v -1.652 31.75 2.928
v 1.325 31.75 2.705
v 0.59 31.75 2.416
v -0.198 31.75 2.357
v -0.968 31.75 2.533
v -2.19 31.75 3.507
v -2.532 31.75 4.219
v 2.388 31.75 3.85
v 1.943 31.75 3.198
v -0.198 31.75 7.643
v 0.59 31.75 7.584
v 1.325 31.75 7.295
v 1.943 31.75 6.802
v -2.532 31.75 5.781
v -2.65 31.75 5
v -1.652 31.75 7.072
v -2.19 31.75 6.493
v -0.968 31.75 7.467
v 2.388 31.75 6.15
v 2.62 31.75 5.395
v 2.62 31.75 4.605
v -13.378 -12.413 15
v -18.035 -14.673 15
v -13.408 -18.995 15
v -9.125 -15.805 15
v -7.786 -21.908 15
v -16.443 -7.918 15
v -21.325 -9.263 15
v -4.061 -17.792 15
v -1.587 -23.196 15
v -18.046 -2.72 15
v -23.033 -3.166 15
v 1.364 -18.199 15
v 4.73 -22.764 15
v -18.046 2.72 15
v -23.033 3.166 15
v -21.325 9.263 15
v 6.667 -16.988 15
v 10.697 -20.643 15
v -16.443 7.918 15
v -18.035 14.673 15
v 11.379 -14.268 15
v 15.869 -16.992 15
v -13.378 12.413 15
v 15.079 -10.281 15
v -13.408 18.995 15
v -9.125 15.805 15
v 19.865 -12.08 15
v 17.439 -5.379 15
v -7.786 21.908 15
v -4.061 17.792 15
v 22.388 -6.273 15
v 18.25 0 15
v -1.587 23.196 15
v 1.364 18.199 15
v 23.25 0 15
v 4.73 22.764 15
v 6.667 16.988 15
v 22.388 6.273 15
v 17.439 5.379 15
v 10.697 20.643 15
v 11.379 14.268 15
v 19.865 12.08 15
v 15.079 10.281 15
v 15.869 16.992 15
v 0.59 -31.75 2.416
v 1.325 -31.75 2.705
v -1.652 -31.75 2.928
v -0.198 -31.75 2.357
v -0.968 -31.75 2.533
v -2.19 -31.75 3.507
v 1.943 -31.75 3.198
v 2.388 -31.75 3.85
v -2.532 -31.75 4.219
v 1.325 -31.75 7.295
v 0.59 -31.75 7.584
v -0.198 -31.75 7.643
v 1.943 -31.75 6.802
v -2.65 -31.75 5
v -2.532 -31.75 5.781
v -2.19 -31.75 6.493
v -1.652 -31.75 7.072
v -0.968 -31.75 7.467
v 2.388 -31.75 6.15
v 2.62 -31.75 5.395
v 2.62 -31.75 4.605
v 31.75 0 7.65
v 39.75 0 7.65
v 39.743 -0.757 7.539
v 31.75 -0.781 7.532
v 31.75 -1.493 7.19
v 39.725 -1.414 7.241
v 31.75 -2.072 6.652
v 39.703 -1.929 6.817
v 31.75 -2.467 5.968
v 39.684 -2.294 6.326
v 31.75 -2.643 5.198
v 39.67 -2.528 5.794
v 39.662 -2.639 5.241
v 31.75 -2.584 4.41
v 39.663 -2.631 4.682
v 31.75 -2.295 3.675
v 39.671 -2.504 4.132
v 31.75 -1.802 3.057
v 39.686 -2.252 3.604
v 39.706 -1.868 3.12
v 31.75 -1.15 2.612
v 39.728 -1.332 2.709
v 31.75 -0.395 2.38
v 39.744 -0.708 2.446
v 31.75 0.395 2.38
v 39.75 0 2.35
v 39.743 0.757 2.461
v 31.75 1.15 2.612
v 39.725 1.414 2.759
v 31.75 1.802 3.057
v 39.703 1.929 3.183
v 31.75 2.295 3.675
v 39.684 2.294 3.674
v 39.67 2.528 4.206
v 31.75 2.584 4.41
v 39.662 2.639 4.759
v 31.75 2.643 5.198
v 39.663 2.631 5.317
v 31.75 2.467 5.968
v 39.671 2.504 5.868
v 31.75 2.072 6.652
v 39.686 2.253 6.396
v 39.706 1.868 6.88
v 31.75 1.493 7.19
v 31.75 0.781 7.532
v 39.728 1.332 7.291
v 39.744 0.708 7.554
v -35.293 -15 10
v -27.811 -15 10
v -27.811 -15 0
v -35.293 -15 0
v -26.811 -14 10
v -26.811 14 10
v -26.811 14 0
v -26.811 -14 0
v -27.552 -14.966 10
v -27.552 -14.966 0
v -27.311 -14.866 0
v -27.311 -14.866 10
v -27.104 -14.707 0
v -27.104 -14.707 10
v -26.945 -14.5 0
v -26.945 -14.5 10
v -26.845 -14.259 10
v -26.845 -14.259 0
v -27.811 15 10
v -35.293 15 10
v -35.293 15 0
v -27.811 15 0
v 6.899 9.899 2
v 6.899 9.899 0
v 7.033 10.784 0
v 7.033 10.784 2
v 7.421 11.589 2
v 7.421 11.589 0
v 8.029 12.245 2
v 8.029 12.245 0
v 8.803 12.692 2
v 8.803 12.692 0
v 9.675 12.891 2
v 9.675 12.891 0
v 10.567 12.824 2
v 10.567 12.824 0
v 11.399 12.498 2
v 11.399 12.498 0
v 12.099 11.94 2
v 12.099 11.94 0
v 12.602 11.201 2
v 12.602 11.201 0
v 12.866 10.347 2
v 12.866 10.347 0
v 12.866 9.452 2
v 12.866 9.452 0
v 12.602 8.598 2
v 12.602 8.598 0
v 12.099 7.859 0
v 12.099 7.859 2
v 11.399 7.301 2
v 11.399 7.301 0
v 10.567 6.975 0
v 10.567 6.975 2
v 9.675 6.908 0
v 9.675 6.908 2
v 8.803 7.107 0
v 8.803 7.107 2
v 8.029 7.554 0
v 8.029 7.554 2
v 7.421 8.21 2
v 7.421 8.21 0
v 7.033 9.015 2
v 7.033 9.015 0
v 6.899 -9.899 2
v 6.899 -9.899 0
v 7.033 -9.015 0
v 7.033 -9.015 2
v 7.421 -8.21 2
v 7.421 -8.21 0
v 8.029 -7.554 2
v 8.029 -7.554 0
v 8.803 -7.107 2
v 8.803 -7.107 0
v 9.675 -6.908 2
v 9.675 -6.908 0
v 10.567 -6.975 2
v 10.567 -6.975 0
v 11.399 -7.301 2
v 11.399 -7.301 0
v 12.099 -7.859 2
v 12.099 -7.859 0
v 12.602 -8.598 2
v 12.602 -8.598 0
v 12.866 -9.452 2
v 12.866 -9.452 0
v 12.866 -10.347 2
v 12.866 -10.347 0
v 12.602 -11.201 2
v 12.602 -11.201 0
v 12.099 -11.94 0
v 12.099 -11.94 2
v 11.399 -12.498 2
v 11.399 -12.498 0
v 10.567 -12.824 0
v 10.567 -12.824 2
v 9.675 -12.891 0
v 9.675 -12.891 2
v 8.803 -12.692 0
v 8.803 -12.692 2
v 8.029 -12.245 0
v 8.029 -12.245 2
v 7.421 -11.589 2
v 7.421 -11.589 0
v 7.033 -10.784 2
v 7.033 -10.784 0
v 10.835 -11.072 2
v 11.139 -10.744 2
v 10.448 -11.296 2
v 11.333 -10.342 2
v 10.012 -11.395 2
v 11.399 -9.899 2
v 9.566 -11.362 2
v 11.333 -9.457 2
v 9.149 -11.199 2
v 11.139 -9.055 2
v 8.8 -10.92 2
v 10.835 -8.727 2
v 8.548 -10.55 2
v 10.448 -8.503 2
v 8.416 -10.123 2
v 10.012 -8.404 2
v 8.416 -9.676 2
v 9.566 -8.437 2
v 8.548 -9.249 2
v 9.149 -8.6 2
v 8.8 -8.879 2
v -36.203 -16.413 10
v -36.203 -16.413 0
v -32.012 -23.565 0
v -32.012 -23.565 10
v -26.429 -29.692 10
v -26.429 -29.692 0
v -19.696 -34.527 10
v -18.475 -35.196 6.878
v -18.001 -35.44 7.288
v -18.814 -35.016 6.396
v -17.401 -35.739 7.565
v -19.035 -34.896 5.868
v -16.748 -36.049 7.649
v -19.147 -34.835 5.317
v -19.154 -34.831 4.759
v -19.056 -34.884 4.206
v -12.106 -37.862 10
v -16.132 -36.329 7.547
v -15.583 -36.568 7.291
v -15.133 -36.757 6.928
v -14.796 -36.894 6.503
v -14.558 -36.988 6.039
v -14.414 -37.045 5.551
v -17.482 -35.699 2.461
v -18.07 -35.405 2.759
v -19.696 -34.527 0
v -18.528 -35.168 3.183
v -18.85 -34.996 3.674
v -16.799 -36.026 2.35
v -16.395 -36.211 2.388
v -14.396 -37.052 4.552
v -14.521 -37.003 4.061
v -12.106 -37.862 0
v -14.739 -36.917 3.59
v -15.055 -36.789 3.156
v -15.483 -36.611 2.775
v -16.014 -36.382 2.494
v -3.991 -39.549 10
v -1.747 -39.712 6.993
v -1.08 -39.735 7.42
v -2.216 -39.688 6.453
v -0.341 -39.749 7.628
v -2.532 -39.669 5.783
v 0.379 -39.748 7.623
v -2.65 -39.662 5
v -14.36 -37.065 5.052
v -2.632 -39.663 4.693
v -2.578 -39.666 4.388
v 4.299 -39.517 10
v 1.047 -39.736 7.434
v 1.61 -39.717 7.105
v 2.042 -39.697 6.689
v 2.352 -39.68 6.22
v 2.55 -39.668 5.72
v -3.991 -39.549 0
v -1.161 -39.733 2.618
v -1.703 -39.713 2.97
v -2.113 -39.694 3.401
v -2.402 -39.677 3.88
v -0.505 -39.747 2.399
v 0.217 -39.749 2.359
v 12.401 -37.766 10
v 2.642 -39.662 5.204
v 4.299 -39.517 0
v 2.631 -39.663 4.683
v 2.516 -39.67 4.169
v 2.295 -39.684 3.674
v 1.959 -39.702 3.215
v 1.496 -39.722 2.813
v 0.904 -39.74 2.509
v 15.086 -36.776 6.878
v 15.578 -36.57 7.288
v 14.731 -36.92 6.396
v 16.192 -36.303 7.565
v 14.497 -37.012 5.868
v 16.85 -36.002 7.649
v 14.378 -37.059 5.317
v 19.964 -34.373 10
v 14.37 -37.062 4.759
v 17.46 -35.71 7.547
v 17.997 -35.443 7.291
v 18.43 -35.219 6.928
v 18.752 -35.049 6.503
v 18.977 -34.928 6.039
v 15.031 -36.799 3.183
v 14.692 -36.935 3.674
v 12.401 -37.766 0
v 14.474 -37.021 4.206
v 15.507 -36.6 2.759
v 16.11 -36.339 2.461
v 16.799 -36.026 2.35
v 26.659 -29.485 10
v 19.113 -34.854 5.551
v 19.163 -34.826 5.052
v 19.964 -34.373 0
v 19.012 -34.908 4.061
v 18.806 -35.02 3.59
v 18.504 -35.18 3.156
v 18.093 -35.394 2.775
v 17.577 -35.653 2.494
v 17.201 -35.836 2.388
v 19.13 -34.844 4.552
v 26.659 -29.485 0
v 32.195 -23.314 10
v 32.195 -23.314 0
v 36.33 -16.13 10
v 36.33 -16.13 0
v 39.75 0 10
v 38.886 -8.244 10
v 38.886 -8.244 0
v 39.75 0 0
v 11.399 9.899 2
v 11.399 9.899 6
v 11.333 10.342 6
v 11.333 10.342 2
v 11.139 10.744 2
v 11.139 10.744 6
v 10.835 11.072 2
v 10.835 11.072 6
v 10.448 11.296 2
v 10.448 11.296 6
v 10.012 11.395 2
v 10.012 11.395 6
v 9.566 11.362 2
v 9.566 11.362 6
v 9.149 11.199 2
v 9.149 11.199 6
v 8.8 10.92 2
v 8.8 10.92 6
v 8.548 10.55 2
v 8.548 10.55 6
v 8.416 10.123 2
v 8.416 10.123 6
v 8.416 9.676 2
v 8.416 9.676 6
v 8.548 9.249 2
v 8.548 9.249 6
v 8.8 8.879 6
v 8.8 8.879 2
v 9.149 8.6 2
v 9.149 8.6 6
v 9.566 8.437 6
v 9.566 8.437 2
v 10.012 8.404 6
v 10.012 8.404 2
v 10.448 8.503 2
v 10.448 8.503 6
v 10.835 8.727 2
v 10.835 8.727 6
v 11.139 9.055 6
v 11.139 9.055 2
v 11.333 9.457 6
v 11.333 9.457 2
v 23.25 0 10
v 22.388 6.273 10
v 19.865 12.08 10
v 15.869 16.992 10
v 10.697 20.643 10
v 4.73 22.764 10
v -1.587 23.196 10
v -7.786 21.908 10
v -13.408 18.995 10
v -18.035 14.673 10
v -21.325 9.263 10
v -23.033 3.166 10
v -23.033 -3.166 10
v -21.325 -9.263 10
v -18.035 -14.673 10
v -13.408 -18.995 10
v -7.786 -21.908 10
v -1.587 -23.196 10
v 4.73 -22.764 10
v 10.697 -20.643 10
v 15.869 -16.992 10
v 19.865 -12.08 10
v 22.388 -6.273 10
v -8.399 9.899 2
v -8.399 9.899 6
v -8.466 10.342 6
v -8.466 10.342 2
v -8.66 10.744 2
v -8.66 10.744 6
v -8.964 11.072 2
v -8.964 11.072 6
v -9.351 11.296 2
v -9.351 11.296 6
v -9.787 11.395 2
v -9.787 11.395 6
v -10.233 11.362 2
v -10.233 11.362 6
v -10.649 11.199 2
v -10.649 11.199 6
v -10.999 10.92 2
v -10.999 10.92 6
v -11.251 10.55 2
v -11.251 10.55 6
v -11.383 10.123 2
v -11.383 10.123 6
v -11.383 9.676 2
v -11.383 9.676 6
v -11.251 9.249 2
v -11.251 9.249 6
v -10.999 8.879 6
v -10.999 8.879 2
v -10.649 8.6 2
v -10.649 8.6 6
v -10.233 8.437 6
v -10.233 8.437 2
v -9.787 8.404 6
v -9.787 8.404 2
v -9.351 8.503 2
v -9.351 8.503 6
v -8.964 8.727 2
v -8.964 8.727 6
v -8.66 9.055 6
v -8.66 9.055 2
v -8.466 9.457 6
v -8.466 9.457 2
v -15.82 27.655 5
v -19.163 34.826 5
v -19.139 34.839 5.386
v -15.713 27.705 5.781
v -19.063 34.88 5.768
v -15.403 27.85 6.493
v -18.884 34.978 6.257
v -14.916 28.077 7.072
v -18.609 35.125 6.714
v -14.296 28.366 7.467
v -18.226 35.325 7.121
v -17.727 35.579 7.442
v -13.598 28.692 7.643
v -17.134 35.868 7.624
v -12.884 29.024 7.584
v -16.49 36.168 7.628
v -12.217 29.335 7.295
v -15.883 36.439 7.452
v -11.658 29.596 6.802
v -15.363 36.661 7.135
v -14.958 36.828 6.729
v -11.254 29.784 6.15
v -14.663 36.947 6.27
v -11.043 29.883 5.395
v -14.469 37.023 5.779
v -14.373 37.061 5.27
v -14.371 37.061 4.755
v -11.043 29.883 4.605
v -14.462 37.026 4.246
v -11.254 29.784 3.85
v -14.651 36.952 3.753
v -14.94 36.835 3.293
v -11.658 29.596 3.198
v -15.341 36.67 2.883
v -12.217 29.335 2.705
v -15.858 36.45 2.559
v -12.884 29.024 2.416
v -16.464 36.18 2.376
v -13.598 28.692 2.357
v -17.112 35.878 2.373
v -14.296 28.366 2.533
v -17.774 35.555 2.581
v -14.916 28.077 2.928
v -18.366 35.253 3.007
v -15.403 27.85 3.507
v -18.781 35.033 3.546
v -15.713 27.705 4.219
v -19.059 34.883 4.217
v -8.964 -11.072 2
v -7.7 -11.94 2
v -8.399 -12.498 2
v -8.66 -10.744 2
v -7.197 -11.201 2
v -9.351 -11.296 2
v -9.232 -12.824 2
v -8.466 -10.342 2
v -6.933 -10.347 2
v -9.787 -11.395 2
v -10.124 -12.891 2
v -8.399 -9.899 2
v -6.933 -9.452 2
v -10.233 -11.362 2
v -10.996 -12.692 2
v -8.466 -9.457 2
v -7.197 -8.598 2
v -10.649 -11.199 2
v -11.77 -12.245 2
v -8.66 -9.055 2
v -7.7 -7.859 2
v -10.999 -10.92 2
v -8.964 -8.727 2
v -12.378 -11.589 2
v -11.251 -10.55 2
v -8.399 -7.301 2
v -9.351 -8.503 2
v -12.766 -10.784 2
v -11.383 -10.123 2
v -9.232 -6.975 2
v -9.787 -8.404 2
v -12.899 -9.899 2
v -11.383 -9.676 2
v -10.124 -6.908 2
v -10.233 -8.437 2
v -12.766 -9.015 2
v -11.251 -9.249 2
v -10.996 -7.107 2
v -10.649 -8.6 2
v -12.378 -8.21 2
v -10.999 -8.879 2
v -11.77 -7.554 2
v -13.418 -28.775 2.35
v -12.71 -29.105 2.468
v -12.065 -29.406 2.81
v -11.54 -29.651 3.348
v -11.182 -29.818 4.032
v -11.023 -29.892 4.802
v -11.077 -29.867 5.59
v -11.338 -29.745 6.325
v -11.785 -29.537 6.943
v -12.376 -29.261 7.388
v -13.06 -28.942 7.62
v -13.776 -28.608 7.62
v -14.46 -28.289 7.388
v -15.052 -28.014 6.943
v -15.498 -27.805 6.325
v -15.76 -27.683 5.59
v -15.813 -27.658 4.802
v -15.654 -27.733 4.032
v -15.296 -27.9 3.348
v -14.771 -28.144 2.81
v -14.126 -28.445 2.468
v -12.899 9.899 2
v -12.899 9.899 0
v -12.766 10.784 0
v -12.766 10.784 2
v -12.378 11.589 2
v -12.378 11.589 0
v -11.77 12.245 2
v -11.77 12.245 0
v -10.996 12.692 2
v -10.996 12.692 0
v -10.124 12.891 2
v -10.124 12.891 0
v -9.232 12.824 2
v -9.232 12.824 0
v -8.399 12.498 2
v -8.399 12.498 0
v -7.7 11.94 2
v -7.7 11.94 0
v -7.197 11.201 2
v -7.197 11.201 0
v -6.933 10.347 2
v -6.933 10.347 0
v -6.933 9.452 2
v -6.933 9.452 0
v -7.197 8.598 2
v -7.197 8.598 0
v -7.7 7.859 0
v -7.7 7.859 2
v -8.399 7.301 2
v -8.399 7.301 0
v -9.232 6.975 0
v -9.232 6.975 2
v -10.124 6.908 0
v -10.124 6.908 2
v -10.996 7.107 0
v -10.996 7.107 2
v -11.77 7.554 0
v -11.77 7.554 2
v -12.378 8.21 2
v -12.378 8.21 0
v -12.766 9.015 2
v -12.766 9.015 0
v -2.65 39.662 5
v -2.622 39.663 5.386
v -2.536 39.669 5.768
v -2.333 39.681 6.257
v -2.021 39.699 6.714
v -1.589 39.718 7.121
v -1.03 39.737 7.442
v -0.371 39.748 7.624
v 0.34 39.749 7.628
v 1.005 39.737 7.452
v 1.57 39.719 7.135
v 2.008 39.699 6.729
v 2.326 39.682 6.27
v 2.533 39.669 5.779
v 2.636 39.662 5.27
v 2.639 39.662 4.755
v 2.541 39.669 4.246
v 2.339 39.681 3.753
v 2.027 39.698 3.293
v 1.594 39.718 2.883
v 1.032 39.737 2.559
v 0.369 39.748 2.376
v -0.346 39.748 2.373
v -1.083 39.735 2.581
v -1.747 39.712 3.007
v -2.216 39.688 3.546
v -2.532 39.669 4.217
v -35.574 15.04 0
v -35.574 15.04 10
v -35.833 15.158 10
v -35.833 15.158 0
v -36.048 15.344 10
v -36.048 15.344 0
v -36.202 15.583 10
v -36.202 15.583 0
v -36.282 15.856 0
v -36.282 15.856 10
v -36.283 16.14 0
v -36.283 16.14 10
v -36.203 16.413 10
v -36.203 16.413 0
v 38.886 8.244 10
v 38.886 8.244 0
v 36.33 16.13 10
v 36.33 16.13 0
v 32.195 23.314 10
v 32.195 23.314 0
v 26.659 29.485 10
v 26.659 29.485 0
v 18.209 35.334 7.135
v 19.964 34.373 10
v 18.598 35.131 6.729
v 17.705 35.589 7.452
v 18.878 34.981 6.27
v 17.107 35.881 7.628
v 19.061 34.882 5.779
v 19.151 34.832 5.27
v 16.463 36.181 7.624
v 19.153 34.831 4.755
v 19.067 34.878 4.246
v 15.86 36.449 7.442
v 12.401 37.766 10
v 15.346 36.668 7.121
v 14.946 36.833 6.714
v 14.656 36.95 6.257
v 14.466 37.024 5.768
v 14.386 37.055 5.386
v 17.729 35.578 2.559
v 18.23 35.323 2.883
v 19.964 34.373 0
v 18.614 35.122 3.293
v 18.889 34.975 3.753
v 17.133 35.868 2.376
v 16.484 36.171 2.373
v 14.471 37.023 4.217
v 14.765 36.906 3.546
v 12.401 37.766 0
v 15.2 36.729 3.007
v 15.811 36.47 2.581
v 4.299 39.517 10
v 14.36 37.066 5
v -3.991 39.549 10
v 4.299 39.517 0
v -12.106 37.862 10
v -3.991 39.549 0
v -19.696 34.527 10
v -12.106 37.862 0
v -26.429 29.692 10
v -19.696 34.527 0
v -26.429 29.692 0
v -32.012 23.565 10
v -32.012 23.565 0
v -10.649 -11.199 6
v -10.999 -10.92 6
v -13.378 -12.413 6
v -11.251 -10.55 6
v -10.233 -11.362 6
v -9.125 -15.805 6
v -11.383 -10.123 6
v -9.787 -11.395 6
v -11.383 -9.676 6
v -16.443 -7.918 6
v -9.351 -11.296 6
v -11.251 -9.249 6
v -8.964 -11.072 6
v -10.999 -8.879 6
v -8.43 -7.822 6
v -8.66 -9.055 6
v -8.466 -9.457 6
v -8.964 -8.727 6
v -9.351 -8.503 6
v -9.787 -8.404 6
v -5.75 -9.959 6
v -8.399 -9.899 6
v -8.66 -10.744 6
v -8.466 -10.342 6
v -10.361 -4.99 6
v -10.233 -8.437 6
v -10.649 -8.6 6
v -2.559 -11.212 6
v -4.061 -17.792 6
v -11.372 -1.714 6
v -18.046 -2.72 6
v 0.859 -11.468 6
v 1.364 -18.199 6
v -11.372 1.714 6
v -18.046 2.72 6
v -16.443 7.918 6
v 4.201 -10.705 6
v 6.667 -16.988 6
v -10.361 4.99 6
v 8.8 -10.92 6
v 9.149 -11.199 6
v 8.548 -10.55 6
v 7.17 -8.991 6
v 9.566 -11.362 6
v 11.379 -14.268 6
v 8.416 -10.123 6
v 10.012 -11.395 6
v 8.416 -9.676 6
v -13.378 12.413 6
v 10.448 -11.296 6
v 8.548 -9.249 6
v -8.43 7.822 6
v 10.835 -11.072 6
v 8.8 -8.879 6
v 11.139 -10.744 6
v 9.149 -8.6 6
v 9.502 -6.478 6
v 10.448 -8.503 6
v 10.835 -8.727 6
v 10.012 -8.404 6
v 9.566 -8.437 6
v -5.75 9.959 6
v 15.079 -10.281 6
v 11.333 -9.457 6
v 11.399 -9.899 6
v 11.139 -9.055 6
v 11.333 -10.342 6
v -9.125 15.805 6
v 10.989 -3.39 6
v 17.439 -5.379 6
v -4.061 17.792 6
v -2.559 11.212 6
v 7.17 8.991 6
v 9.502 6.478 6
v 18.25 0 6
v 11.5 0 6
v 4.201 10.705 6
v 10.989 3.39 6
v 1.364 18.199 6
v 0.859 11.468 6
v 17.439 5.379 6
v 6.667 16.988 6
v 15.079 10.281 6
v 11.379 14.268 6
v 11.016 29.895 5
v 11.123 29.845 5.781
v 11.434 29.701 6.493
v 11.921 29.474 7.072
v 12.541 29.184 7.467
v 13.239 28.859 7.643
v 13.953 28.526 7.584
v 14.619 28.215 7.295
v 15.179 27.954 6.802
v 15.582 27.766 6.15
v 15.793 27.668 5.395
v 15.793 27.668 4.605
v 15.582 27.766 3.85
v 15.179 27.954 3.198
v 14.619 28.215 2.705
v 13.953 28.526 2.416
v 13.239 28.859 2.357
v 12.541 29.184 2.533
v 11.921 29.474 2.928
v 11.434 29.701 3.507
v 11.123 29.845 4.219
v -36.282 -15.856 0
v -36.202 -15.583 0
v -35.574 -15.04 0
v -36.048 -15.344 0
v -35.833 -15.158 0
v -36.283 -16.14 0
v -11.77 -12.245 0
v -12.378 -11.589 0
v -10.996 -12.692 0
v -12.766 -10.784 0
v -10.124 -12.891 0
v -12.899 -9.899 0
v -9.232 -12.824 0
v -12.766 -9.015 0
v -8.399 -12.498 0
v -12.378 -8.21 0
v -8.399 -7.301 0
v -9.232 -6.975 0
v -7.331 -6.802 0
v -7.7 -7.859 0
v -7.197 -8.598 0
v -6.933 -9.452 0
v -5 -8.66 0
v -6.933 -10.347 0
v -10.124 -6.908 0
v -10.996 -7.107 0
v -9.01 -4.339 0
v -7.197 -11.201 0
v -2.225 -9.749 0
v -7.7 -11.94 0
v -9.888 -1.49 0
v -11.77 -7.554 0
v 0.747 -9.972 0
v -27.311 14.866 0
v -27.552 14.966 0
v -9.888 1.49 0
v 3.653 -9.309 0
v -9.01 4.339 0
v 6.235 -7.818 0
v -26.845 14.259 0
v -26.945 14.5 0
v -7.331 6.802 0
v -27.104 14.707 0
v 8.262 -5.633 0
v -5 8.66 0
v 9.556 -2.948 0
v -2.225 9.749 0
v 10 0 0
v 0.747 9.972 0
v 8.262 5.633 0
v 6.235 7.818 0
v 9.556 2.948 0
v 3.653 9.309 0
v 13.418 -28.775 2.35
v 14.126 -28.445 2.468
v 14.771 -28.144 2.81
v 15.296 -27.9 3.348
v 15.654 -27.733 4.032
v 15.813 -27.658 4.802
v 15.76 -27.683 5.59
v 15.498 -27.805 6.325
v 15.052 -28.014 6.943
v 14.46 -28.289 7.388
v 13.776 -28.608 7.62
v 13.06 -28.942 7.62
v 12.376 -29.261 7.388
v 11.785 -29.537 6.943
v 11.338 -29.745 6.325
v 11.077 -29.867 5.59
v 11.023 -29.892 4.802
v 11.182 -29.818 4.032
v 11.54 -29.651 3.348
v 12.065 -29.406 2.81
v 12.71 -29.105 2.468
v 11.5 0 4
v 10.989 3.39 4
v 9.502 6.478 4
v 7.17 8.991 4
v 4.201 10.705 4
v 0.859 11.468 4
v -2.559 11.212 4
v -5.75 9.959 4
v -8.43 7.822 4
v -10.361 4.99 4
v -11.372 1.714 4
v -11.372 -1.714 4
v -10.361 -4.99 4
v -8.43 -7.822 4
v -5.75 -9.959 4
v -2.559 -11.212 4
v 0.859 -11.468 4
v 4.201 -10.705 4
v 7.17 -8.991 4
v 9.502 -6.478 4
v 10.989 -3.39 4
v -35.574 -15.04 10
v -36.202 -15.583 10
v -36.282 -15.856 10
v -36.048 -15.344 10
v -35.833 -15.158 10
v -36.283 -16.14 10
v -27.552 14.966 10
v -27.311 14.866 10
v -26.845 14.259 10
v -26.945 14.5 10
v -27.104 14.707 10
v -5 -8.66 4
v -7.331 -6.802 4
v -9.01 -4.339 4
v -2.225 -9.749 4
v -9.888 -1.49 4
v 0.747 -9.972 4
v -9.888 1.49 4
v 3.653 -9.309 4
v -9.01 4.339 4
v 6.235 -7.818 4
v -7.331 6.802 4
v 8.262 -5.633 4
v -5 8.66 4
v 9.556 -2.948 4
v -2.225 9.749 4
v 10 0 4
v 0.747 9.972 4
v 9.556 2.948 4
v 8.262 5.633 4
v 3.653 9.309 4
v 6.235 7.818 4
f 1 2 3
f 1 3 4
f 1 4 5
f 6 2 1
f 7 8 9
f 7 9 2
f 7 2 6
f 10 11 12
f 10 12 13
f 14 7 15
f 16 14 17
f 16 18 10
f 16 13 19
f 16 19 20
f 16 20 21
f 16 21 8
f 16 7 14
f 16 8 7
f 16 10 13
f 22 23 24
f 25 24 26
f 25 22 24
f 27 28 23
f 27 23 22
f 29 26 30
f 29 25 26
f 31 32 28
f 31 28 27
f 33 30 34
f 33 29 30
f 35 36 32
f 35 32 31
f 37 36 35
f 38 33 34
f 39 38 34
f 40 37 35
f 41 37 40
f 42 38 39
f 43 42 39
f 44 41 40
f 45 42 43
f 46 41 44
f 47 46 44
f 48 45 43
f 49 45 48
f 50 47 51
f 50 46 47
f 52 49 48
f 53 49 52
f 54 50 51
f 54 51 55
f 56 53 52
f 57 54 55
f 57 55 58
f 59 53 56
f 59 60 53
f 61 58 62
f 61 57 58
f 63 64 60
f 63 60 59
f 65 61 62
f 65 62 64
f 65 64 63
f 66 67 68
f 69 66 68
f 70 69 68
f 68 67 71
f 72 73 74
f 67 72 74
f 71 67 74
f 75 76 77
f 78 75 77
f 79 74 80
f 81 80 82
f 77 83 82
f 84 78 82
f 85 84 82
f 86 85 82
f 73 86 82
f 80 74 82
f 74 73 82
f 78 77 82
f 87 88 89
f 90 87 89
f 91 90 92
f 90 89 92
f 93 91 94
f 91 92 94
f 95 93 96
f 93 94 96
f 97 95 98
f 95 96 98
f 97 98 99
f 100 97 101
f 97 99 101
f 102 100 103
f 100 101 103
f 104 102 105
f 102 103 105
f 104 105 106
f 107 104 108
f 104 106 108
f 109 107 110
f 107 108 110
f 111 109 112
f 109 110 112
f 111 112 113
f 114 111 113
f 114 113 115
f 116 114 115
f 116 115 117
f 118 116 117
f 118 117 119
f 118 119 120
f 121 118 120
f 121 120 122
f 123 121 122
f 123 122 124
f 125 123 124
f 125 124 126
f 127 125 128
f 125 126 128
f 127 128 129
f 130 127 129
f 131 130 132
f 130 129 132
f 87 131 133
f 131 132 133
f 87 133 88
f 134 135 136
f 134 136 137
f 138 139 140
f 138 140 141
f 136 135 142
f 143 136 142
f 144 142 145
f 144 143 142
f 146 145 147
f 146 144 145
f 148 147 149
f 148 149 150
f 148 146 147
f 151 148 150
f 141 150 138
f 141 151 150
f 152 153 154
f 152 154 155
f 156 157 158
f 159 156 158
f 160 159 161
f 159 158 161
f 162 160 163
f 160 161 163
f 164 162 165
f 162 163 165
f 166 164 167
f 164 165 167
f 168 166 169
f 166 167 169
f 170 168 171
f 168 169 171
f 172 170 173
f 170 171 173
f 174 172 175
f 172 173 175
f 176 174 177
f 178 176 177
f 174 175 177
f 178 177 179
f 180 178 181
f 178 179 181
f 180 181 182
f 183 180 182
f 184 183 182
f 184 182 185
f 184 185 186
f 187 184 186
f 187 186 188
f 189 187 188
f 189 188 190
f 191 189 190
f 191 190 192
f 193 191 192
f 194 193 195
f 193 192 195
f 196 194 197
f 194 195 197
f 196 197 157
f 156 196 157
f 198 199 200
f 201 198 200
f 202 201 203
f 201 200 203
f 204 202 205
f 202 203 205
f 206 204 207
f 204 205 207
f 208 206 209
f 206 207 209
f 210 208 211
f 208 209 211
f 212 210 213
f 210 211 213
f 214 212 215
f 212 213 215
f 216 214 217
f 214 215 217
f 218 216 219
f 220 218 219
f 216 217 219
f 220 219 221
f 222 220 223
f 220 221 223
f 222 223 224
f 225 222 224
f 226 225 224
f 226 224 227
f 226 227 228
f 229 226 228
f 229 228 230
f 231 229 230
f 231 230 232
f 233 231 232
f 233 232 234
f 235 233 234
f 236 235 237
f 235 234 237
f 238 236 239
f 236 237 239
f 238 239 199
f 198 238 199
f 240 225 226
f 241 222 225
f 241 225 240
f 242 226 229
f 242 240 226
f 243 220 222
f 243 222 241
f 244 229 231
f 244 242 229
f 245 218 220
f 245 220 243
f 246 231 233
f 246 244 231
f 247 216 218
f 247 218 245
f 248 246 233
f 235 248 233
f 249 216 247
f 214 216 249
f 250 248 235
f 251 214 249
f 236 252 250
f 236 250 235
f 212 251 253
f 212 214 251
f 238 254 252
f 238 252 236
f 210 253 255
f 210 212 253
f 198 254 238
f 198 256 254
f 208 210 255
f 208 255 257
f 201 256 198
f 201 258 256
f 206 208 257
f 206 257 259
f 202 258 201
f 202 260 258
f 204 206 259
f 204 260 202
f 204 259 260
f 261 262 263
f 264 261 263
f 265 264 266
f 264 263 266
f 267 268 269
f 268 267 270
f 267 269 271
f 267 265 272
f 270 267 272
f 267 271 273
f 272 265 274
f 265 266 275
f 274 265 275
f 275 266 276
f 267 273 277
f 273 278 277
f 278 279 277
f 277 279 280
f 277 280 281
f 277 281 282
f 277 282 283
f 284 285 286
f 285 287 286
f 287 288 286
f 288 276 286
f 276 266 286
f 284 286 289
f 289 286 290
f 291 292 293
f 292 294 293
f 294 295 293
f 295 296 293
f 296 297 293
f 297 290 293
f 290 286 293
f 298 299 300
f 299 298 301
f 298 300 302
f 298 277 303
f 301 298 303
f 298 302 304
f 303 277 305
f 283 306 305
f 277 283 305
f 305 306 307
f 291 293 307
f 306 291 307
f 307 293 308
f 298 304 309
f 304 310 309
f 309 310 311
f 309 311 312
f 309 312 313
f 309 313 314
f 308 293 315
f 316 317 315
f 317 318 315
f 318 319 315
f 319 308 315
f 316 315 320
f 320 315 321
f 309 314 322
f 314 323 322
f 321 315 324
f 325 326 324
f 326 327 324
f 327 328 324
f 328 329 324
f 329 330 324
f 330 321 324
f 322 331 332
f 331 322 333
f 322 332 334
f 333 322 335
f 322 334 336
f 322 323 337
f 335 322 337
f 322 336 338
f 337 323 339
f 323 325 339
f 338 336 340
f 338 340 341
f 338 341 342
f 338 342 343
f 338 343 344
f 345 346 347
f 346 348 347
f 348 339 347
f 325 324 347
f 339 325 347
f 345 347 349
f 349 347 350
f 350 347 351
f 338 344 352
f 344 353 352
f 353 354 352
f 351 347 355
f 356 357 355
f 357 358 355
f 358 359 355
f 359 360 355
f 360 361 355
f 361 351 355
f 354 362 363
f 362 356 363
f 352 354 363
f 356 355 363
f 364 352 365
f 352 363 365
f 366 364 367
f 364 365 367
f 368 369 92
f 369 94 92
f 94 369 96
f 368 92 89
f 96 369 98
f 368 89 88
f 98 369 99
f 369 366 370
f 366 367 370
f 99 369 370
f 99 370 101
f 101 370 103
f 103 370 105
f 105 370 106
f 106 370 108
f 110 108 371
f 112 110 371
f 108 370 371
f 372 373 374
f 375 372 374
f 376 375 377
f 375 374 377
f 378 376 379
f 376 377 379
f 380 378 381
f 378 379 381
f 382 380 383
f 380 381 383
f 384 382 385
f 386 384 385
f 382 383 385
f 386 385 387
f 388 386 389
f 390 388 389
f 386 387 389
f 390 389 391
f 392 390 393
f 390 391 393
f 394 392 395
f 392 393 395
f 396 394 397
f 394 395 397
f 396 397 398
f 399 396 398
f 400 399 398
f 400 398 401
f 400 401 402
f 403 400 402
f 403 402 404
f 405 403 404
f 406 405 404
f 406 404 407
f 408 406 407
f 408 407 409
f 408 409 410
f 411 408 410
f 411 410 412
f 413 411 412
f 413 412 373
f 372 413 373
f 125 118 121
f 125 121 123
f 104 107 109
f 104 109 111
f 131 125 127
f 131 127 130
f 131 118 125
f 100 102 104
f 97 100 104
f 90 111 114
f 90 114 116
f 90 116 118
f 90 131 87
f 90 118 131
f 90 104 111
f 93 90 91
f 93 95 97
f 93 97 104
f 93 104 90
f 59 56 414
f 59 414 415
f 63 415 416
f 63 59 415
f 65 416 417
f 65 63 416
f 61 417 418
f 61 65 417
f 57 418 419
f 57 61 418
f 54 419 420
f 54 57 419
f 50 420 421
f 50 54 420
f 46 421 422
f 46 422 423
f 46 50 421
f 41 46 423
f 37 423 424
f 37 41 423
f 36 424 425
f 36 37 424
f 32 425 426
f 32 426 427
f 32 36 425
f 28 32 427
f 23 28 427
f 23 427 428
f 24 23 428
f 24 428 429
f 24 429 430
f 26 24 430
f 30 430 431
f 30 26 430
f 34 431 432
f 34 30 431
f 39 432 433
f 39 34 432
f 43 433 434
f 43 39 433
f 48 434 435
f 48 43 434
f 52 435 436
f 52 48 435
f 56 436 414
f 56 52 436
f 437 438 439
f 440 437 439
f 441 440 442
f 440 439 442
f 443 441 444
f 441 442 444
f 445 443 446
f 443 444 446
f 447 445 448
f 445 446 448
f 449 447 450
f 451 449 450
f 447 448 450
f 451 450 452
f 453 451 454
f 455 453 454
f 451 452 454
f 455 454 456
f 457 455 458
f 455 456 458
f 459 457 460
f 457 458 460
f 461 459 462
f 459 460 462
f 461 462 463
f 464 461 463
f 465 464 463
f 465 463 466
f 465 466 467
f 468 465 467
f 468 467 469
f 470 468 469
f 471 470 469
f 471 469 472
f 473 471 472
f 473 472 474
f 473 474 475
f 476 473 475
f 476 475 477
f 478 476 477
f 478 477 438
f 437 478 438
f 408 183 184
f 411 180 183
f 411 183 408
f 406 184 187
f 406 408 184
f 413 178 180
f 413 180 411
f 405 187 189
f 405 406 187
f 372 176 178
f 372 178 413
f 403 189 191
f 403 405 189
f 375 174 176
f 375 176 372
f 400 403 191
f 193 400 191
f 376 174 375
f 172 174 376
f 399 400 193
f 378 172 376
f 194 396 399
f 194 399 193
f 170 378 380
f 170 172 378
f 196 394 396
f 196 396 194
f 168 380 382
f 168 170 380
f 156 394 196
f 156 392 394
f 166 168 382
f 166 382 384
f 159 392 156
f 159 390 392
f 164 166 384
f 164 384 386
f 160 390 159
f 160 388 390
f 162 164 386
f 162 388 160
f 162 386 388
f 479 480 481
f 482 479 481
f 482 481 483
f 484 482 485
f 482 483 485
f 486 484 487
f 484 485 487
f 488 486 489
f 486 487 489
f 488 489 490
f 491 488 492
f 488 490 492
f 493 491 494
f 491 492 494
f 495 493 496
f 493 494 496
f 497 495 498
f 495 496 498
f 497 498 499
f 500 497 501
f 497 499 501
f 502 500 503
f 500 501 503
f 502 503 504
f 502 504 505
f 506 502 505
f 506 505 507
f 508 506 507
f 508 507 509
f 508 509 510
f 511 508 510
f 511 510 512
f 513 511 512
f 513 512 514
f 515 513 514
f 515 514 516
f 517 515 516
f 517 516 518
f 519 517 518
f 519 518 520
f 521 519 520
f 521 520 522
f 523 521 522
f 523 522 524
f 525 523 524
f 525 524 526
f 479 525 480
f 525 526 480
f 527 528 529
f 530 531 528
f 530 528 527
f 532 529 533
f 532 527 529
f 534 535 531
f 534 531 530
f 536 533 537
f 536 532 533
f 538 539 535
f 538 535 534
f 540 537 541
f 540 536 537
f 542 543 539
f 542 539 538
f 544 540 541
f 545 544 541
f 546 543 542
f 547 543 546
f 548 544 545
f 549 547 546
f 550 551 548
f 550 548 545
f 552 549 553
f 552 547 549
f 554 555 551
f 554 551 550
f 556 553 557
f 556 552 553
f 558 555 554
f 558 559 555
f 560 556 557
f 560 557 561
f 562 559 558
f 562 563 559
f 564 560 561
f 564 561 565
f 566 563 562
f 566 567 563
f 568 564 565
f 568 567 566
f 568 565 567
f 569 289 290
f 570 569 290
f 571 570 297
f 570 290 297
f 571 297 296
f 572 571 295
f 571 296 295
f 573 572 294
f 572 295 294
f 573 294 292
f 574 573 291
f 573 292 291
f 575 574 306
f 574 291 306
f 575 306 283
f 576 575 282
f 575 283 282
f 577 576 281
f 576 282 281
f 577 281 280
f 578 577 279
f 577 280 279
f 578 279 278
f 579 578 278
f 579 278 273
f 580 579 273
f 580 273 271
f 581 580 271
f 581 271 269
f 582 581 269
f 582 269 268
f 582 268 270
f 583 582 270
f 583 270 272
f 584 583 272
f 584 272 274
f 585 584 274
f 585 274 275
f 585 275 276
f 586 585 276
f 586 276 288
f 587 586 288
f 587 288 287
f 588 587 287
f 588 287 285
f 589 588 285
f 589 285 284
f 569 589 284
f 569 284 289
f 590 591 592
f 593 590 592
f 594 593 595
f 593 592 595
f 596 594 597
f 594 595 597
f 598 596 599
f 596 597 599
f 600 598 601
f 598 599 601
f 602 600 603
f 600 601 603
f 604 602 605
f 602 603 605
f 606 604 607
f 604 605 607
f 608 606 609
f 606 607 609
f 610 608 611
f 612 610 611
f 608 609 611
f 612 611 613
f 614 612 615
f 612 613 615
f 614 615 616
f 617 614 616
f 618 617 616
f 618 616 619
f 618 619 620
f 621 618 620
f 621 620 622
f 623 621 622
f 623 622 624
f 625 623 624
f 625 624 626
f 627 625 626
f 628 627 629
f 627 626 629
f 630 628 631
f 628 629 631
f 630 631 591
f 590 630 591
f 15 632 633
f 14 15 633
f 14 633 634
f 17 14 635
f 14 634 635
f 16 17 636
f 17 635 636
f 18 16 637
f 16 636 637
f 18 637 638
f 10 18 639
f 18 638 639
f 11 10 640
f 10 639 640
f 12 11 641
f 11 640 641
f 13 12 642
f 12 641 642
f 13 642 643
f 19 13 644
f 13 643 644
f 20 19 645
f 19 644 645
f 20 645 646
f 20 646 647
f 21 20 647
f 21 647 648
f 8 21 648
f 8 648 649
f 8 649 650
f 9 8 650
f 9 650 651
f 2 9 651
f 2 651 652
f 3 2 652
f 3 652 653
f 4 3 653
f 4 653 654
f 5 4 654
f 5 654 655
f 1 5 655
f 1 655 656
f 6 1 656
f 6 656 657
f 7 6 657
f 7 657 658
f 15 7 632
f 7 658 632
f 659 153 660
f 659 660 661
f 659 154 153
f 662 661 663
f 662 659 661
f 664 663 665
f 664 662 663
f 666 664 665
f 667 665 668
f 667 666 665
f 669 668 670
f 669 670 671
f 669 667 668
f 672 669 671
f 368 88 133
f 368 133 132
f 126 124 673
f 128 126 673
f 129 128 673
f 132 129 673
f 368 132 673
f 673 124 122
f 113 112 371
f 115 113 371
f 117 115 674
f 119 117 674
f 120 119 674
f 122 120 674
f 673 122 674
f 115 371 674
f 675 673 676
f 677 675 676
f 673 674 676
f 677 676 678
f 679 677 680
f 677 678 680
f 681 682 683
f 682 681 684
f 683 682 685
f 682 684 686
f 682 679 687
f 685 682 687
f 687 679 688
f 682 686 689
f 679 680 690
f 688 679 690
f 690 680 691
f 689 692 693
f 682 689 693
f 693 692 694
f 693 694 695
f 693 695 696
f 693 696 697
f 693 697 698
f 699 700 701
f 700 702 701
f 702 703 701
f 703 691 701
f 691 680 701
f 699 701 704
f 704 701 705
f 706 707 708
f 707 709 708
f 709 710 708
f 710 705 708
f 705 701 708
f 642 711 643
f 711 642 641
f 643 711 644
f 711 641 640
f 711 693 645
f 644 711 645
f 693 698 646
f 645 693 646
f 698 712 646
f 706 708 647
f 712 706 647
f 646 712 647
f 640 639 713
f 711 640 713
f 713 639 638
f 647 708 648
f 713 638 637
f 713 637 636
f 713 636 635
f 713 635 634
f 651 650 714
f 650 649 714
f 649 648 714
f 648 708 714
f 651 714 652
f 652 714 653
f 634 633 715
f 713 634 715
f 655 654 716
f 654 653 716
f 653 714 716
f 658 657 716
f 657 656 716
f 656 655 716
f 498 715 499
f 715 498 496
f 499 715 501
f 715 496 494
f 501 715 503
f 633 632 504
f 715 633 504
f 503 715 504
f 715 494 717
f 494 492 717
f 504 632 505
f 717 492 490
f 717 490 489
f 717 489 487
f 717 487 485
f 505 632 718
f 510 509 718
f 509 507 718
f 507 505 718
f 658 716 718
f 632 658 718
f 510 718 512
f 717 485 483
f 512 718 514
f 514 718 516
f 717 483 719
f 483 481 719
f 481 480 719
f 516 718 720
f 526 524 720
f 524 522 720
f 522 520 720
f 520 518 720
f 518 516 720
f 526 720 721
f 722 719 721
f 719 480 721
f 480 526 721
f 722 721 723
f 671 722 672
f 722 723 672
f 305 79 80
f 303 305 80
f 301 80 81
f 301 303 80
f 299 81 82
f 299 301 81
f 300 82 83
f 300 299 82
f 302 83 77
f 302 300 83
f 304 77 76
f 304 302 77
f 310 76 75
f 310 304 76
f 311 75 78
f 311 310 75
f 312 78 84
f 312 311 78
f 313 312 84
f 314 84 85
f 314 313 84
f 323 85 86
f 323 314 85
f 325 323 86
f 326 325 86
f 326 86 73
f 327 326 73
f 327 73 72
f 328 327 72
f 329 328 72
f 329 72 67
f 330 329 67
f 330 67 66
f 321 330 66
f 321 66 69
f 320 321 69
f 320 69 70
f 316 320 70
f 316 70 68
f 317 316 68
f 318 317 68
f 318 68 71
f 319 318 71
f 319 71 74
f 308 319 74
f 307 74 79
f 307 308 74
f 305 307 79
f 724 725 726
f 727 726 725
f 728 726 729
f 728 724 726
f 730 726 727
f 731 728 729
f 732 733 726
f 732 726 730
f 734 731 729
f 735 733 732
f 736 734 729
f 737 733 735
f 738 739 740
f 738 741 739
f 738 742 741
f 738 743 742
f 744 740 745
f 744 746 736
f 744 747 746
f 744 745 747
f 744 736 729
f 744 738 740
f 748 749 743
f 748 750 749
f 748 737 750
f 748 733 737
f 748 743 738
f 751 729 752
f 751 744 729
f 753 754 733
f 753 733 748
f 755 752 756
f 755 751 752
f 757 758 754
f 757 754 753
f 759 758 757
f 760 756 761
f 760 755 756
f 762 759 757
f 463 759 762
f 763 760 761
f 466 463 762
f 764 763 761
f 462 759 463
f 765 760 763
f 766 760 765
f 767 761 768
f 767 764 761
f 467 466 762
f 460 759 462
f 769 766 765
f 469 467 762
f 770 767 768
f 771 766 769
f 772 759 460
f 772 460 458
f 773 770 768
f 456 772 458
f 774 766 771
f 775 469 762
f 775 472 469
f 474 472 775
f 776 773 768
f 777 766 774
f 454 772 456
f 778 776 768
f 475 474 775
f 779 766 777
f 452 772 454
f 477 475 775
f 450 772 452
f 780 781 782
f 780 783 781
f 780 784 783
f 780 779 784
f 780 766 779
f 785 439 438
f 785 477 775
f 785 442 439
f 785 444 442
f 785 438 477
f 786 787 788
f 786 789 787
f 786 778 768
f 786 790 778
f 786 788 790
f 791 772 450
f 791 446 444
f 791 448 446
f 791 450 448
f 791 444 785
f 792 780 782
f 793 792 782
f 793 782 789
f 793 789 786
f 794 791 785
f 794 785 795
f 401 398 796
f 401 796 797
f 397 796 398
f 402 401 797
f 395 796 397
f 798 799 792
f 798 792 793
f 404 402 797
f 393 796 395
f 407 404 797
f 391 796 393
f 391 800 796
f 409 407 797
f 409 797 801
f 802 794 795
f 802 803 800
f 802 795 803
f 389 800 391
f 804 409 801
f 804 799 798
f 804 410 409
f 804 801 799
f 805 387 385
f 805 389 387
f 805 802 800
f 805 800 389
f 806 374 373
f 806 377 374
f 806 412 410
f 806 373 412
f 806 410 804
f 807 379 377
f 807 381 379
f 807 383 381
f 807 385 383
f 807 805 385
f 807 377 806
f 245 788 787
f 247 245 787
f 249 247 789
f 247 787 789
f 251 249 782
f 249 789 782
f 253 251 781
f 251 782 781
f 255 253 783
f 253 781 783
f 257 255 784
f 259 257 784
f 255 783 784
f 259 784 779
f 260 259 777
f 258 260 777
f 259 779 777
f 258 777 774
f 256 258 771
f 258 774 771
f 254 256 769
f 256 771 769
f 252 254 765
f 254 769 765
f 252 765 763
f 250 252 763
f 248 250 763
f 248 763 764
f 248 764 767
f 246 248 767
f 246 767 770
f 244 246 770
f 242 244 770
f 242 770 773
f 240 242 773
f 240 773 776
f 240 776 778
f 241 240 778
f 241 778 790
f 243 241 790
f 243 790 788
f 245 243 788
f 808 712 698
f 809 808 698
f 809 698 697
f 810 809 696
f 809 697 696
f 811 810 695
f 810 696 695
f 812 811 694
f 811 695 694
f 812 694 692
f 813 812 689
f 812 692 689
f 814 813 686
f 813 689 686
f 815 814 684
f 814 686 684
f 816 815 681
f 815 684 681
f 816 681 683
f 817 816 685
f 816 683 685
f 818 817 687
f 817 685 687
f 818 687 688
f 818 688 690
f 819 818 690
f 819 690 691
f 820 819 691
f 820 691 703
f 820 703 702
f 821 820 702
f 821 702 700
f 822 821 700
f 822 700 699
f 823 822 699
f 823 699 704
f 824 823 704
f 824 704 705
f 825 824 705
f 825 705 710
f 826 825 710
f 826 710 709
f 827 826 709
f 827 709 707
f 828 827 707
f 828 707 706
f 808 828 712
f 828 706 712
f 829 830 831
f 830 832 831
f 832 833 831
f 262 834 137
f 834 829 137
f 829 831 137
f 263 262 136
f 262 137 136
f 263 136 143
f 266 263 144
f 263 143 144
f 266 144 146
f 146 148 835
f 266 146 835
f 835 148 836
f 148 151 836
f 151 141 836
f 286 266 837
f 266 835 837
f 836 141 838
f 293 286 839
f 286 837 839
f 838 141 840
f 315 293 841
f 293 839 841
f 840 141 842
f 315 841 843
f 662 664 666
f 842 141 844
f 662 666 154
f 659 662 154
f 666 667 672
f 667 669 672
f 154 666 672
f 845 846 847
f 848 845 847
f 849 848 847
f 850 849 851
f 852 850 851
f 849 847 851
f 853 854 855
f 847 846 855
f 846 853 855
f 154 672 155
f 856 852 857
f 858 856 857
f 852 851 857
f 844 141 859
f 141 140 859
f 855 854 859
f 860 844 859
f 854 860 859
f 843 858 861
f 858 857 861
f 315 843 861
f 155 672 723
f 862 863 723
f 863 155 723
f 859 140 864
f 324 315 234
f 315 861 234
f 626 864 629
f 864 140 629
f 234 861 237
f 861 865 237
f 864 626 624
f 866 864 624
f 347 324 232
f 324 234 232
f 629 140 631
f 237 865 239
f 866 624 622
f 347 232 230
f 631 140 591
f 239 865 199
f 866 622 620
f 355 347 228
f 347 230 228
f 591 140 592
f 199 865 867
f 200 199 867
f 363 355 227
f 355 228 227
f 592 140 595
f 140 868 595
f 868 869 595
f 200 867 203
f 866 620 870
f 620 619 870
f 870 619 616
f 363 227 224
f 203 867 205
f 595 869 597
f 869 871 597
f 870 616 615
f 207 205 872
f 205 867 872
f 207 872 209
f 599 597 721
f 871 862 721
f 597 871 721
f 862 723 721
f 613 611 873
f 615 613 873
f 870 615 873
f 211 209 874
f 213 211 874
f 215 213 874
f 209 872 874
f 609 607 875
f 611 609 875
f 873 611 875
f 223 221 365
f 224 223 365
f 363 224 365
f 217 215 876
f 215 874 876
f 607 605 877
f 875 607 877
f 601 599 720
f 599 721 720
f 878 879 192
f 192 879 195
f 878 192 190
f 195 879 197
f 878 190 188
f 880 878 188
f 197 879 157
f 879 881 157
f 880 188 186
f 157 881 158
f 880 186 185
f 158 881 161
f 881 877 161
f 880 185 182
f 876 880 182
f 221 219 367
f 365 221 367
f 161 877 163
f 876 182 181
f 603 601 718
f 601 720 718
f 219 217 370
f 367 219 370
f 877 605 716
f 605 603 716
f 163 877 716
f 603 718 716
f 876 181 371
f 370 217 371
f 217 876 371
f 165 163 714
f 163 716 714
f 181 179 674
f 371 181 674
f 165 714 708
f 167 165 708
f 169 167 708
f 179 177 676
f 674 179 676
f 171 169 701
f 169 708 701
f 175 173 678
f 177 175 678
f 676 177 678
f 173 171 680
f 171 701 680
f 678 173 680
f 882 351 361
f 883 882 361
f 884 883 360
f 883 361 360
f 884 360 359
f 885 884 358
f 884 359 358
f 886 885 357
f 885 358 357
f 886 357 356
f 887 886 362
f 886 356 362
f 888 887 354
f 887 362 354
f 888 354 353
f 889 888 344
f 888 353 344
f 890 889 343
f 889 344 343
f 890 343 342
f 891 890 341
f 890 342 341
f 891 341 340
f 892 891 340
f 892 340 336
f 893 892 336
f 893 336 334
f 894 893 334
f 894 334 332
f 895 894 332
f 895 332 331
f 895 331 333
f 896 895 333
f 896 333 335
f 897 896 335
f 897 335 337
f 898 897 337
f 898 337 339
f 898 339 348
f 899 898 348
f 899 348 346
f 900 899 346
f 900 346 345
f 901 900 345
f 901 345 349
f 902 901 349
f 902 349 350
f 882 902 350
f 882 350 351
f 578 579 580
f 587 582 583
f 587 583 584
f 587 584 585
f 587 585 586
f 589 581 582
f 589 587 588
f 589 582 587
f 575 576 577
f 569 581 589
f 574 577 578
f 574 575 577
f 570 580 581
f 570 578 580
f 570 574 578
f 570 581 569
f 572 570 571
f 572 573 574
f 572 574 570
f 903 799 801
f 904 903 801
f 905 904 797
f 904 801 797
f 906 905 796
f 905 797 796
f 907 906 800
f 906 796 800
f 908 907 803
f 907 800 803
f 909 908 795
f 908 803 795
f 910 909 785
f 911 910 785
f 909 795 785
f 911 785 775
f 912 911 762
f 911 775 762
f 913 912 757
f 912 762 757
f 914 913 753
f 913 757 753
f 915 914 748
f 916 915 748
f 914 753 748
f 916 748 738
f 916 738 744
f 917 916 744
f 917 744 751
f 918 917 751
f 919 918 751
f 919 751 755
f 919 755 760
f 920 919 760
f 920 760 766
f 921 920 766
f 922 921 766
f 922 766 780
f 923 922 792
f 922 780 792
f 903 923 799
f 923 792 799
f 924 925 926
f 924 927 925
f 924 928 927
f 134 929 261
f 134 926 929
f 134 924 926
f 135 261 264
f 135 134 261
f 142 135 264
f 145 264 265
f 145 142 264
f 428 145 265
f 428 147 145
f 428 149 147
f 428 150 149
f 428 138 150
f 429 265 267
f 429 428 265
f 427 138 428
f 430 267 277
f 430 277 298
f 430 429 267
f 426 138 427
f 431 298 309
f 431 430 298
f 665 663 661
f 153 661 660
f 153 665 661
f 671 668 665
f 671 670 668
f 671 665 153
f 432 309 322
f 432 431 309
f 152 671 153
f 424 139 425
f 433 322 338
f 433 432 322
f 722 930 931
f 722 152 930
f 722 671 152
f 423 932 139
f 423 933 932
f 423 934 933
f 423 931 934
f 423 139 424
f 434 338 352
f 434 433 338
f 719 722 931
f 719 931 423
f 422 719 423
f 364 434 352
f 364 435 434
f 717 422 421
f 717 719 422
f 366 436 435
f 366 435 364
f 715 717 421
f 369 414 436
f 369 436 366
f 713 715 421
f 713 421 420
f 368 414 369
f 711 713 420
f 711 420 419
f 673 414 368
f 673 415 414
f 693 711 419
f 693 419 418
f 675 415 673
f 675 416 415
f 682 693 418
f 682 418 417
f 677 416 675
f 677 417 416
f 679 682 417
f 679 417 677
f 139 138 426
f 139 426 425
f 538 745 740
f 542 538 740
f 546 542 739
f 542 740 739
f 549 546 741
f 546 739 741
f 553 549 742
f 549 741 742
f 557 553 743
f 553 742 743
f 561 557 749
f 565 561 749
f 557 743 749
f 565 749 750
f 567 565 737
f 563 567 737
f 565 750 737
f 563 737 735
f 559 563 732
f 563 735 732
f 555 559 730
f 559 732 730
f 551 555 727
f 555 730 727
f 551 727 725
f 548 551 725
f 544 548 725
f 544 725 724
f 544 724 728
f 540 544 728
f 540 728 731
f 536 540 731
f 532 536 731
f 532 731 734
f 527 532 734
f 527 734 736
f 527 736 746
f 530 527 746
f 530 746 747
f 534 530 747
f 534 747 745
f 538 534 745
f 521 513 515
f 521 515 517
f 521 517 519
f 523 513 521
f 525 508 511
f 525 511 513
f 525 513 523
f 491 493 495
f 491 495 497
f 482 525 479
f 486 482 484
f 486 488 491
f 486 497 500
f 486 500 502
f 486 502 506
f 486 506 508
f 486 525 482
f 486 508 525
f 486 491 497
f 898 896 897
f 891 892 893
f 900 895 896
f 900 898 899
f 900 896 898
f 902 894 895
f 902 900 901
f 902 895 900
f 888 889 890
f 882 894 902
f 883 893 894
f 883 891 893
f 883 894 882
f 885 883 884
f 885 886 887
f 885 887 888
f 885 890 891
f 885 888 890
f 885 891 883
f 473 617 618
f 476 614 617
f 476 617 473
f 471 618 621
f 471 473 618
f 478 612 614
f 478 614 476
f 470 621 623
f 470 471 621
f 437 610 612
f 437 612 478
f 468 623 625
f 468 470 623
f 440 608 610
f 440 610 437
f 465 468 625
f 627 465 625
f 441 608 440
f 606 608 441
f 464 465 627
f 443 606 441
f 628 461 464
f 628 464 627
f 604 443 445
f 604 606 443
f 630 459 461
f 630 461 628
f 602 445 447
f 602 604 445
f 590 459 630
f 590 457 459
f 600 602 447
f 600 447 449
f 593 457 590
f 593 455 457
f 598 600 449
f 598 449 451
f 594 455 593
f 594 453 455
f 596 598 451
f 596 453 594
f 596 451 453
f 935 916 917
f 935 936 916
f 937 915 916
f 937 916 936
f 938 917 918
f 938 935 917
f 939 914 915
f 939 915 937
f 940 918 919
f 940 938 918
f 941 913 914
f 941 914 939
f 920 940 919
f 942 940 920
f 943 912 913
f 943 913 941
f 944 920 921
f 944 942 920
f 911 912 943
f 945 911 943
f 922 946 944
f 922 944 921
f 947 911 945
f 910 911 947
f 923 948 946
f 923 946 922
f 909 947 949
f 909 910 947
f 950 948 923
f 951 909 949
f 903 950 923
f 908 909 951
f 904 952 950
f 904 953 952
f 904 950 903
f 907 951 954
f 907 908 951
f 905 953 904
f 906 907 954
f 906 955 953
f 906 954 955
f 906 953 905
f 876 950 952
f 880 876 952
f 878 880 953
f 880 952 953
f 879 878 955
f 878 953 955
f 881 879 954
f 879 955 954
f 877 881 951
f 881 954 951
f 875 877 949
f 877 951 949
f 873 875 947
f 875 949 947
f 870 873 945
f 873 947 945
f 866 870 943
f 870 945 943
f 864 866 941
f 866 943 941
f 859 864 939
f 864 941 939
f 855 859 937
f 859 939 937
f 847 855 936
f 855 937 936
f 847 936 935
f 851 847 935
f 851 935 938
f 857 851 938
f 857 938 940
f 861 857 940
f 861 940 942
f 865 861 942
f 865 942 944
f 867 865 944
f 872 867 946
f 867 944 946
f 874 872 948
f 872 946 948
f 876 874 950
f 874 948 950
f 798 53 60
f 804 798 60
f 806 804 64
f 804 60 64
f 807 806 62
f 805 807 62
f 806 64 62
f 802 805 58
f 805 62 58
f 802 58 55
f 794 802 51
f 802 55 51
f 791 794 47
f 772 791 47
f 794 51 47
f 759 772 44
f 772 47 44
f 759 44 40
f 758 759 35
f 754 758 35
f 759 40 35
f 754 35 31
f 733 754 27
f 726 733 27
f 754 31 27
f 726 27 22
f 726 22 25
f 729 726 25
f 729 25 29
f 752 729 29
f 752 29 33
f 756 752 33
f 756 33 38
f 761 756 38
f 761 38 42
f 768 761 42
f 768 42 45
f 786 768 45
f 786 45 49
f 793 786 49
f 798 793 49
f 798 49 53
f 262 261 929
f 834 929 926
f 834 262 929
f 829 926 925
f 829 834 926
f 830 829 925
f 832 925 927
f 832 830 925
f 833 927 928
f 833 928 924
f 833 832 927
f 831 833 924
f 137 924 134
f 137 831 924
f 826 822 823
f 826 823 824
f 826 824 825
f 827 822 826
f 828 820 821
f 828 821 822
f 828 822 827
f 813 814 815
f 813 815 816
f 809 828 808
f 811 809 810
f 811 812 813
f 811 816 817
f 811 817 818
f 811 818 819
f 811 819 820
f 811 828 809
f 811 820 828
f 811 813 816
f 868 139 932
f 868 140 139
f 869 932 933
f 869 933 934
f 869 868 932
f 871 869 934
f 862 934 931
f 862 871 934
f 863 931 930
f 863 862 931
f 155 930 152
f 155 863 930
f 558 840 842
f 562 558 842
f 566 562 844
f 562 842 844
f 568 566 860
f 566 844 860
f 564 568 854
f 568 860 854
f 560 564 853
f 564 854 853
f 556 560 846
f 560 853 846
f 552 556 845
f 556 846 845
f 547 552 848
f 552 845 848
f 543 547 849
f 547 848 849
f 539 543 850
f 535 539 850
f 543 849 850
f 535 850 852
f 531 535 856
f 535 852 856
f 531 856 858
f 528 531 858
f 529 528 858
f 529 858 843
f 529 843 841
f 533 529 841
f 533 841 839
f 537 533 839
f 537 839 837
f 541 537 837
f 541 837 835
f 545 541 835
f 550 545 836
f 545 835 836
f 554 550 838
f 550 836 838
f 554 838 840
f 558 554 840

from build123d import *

# Parameters (mm, degrees)
SKETCH_1_R               = 39.75
EXTRUDE_1_DEPTH          = 10
SKETCH_2_R               = 18.25
CUT_EXTRUDE_1_DEPTH      = 4
SKETCH_3_R               = 11.5
CUT_EXTRUDE_2_DEPTH      = 2
SKETCH_4_R               = 1.5
CUT_EXTRUDE_3_DEPTH      = 6
SKETCH_5_R               = 3
CUT_EXTRUDE_4_DEPTH      = 2
SKETCH_7_R               = 2.65
CUT_EXTRUDE_5_DEPTH      = 8
PATTERN_CIRCULAR_1_COUNT = 2
PATTERN_CIRCULAR_1_ANGLE = 25
F_1_THE_OTHER_WAY_COUNT  = 2
F_1_THE_OTHER_WAY_ANGLE  = 25
MIRROR_1_COPY_1_SKETCH_R = 2.65
MIRROR_1_COPY_1_DEPTH    = 8
MIRROR_1_COPY_2_SKETCH_R = 2.65
MIRROR_1_COPY_2_DEPTH    = 8
SKETCH_8_R               = 10
CUT_EXTRUDE_6_DEPTH      = 4
SKETCH_9_R               = 2.65
CUT_EXTRUDE_7_DEPTH      = 8
PATTERN_CIRCULAR_2_COUNT = 2
EXTRUDE_START            = 5
SKETCH_10_R              = 23.25
SKETCH_10_R_2            = 18.25
EXTRUDE_2_DEPTH          = 5
CUT_EXTRUDE_START        = -10
CUT_EXTRUDE_8_DEPTH      = 10
FILLET_1_R               = 1


# Read off the part's stored shape, not the designer's step: Вырез-Вытянуть8
with BuildPart() as part:
    # Эскиз1 → Бобышка-Вытянуть1 (new body)
    with BuildSketch(Plane.XY):
        Circle(SKETCH_1_R)
    extrude(amount=EXTRUDE_1_DEPTH)

    # Эскиз2 → Вырез-Вытянуть1 (cut)
    with BuildSketch(Plane.XY.offset(10)):
        Circle(SKETCH_2_R)
    extrude(amount=-CUT_EXTRUDE_1_DEPTH, mode=Mode.SUBTRACT)

    # Эскиз3 → Вырез-Вытянуть2 (cut)
    with BuildSketch(Plane.XY.offset(6)):
        Circle(SKETCH_3_R)
    extrude(amount=-CUT_EXTRUDE_2_DEPTH, mode=Mode.SUBTRACT)

    # Эскиз4 → Вырез-Вытянуть3 (cut)
    with BuildSketch(Plane.XY.offset(6)):
        with Locations((-9.899494937, 9.899494937)):
            Circle(SKETCH_4_R)
        with Locations((9.899494937, 9.899494937)):
            Circle(SKETCH_4_R)
        with Locations((9.899494937, -9.899494937)):
            Circle(SKETCH_4_R)
        with Locations((-9.899494937, -9.899494937)):
            Circle(SKETCH_4_R)
    extrude(amount=-CUT_EXTRUDE_3_DEPTH, mode=Mode.SUBTRACT)

    # Эскиз5 → Вырез-Вытянуть4 (cut)
    with BuildSketch(Plane(origin=(0, 0, 0), x_dir=(-1, 0, 0), z_dir=(0, 0, -1))):
        with Locations((-9.899494937, 9.899494937)):
            Circle(SKETCH_5_R)
        with Locations((9.899494937, 9.899494937)):
            Circle(SKETCH_5_R)
        with Locations((9.899494937, -9.899494937)):
            Circle(SKETCH_5_R)
        with Locations((-9.899494937, -9.899494937)):
            Circle(SKETCH_5_R)
    extrude(amount=-CUT_EXTRUDE_4_DEPTH, mode=Mode.SUBTRACT)

    # Эскиз7 → Вырез-Вытянуть5 (cut)
    with BuildSketch(Plane(origin=(0, 39.75, 0), x_dir=(0, 0, -1), z_dir=(0, 1, 0))):
        with Locations(Location((-5, 0, 0), (0, 0, 90))):
            Circle(SKETCH_7_R)
    cut_extrude_5 = extrude(amount=-CUT_EXTRUDE_5_DEPTH, mode=Mode.SUBTRACT)

    # Круговой массив1: Вырез-Вытянуть5 ×2 about axis
    pattern_circular_1_axis = Axis((0, 0, 10), (0, 0, -1))
    for i in range(1, PATTERN_CIRCULAR_1_COUNT):
        add(cut_extrude_5.rotate(pattern_circular_1_axis, i * PATTERN_CIRCULAR_1_ANGLE / (PATTERN_CIRCULAR_1_COUNT - 1)), mode=Mode.SUBTRACT)

    # 1 the other way: Вырез-Вытянуть5 ×2 about axis
    f_1_the_other_way_axis = Axis((0, 0, 10), (0, 0, 1))
    for i in range(1, F_1_THE_OTHER_WAY_COUNT):
        add(cut_extrude_5.rotate(f_1_the_other_way_axis, i * F_1_THE_OTHER_WAY_ANGLE / (F_1_THE_OTHER_WAY_COUNT - 1)), mode=Mode.SUBTRACT)

    # Зеркальное отражение1: Вырез-Вытянуть5 across plane
    add(cut_extrude_5.mirror(Plane.ZX), mode=Mode.SUBTRACT)

    # Зеркальное отражение1 copy 1 sketch → Зеркальное отражение1 copy 1 (cut)
    with BuildSketch(Plane(origin=(16.799075904, -36.025734535, 0), x_dir=(0, 0, -1), z_dir=(0.4226182617407035, -0.906307787036648, 0))):
        with Locations((-5, 0)):
            Circle(MIRROR_1_COPY_1_SKETCH_R)
    extrude(amount=-MIRROR_1_COPY_1_DEPTH, mode=Mode.SUBTRACT)

    # Зеркальное отражение1 copy 2 sketch → Зеркальное отражение1 copy 2 (cut)
    with BuildSketch(Plane(origin=(-16.799075904, -36.025734535, 0), x_dir=(0, 0, -1), z_dir=(-0.42261826174069717, -0.9063077870366509, 0))):
        with Locations((-5, 0)):
            Circle(MIRROR_1_COPY_2_SKETCH_R)
    extrude(amount=-MIRROR_1_COPY_2_DEPTH, mode=Mode.SUBTRACT)

    # Эскиз8 → Вырез-Вытянуть6 (cut)
    with BuildSketch(Plane.XY.offset(4)):
        Circle(SKETCH_8_R)
    extrude(amount=-CUT_EXTRUDE_6_DEPTH, mode=Mode.SUBTRACT)

    # Эскиз9 → Вырез-Вытянуть7 (cut)
    with BuildSketch(Plane.ZY.offset(39.75)):
        with Locations((5, 0)):
            Circle(SKETCH_9_R)
    cut_extrude_7 = extrude(amount=-CUT_EXTRUDE_7_DEPTH, mode=Mode.SUBTRACT)

    # Круговой массив2: Вырез-Вытянуть7 ×2 about axis
    pattern_circular_2_axis = Axis((0, 0, 10), (0, 0, -1))
    for i in range(1, PATTERN_CIRCULAR_2_COUNT):
        add(cut_extrude_7.rotate(pattern_circular_2_axis, i * 360 / PATTERN_CIRCULAR_2_COUNT), mode=Mode.SUBTRACT)

    # Эскиз10 → Бобышка-Вытянуть2 (add)
    with BuildSketch(Plane.XY.offset(10).offset(EXTRUDE_START)):
        Circle(SKETCH_10_R)
        Circle(SKETCH_10_R_2, mode=Mode.SUBTRACT)
    extrude(amount=-EXTRUDE_2_DEPTH)

    # Вырез-Вытянуть8 outline → Вырез-Вытянуть8 (cut)
    with BuildSketch(Plane(origin=(0, 0, 0), x_dir=(-1, 0, 0), z_dir=(0, 0, -1)).offset(CUT_EXTRUDE_START)):
        with BuildLine():
            Line((36.811173575, 15), (26.811173575, 15))
            Line((26.811173575, 15), (26.811173575, -15))
            Line((26.811173575, -15), (36.811173575, -15))
            ThreePointArc((36.811173575, -15), (39.75, 0), (36.811173575, 15))
        make_face()
    extrude(amount=CUT_EXTRUDE_8_DEPTH, mode=Mode.SUBTRACT)

    # Скругление1
    fillet_1_edges = [part.edges().sort_by_distance(p)[0] for p in [
        (-26.811173575, 15, 5),
        (-26.811173575, -15, 5),
        (-36.811173575, -15, 5),
        (-36.811173575, 15, 5),
    ]]
    fillet(fillet_1_edges, radius=FILLET_1_R)


solid = part.part
